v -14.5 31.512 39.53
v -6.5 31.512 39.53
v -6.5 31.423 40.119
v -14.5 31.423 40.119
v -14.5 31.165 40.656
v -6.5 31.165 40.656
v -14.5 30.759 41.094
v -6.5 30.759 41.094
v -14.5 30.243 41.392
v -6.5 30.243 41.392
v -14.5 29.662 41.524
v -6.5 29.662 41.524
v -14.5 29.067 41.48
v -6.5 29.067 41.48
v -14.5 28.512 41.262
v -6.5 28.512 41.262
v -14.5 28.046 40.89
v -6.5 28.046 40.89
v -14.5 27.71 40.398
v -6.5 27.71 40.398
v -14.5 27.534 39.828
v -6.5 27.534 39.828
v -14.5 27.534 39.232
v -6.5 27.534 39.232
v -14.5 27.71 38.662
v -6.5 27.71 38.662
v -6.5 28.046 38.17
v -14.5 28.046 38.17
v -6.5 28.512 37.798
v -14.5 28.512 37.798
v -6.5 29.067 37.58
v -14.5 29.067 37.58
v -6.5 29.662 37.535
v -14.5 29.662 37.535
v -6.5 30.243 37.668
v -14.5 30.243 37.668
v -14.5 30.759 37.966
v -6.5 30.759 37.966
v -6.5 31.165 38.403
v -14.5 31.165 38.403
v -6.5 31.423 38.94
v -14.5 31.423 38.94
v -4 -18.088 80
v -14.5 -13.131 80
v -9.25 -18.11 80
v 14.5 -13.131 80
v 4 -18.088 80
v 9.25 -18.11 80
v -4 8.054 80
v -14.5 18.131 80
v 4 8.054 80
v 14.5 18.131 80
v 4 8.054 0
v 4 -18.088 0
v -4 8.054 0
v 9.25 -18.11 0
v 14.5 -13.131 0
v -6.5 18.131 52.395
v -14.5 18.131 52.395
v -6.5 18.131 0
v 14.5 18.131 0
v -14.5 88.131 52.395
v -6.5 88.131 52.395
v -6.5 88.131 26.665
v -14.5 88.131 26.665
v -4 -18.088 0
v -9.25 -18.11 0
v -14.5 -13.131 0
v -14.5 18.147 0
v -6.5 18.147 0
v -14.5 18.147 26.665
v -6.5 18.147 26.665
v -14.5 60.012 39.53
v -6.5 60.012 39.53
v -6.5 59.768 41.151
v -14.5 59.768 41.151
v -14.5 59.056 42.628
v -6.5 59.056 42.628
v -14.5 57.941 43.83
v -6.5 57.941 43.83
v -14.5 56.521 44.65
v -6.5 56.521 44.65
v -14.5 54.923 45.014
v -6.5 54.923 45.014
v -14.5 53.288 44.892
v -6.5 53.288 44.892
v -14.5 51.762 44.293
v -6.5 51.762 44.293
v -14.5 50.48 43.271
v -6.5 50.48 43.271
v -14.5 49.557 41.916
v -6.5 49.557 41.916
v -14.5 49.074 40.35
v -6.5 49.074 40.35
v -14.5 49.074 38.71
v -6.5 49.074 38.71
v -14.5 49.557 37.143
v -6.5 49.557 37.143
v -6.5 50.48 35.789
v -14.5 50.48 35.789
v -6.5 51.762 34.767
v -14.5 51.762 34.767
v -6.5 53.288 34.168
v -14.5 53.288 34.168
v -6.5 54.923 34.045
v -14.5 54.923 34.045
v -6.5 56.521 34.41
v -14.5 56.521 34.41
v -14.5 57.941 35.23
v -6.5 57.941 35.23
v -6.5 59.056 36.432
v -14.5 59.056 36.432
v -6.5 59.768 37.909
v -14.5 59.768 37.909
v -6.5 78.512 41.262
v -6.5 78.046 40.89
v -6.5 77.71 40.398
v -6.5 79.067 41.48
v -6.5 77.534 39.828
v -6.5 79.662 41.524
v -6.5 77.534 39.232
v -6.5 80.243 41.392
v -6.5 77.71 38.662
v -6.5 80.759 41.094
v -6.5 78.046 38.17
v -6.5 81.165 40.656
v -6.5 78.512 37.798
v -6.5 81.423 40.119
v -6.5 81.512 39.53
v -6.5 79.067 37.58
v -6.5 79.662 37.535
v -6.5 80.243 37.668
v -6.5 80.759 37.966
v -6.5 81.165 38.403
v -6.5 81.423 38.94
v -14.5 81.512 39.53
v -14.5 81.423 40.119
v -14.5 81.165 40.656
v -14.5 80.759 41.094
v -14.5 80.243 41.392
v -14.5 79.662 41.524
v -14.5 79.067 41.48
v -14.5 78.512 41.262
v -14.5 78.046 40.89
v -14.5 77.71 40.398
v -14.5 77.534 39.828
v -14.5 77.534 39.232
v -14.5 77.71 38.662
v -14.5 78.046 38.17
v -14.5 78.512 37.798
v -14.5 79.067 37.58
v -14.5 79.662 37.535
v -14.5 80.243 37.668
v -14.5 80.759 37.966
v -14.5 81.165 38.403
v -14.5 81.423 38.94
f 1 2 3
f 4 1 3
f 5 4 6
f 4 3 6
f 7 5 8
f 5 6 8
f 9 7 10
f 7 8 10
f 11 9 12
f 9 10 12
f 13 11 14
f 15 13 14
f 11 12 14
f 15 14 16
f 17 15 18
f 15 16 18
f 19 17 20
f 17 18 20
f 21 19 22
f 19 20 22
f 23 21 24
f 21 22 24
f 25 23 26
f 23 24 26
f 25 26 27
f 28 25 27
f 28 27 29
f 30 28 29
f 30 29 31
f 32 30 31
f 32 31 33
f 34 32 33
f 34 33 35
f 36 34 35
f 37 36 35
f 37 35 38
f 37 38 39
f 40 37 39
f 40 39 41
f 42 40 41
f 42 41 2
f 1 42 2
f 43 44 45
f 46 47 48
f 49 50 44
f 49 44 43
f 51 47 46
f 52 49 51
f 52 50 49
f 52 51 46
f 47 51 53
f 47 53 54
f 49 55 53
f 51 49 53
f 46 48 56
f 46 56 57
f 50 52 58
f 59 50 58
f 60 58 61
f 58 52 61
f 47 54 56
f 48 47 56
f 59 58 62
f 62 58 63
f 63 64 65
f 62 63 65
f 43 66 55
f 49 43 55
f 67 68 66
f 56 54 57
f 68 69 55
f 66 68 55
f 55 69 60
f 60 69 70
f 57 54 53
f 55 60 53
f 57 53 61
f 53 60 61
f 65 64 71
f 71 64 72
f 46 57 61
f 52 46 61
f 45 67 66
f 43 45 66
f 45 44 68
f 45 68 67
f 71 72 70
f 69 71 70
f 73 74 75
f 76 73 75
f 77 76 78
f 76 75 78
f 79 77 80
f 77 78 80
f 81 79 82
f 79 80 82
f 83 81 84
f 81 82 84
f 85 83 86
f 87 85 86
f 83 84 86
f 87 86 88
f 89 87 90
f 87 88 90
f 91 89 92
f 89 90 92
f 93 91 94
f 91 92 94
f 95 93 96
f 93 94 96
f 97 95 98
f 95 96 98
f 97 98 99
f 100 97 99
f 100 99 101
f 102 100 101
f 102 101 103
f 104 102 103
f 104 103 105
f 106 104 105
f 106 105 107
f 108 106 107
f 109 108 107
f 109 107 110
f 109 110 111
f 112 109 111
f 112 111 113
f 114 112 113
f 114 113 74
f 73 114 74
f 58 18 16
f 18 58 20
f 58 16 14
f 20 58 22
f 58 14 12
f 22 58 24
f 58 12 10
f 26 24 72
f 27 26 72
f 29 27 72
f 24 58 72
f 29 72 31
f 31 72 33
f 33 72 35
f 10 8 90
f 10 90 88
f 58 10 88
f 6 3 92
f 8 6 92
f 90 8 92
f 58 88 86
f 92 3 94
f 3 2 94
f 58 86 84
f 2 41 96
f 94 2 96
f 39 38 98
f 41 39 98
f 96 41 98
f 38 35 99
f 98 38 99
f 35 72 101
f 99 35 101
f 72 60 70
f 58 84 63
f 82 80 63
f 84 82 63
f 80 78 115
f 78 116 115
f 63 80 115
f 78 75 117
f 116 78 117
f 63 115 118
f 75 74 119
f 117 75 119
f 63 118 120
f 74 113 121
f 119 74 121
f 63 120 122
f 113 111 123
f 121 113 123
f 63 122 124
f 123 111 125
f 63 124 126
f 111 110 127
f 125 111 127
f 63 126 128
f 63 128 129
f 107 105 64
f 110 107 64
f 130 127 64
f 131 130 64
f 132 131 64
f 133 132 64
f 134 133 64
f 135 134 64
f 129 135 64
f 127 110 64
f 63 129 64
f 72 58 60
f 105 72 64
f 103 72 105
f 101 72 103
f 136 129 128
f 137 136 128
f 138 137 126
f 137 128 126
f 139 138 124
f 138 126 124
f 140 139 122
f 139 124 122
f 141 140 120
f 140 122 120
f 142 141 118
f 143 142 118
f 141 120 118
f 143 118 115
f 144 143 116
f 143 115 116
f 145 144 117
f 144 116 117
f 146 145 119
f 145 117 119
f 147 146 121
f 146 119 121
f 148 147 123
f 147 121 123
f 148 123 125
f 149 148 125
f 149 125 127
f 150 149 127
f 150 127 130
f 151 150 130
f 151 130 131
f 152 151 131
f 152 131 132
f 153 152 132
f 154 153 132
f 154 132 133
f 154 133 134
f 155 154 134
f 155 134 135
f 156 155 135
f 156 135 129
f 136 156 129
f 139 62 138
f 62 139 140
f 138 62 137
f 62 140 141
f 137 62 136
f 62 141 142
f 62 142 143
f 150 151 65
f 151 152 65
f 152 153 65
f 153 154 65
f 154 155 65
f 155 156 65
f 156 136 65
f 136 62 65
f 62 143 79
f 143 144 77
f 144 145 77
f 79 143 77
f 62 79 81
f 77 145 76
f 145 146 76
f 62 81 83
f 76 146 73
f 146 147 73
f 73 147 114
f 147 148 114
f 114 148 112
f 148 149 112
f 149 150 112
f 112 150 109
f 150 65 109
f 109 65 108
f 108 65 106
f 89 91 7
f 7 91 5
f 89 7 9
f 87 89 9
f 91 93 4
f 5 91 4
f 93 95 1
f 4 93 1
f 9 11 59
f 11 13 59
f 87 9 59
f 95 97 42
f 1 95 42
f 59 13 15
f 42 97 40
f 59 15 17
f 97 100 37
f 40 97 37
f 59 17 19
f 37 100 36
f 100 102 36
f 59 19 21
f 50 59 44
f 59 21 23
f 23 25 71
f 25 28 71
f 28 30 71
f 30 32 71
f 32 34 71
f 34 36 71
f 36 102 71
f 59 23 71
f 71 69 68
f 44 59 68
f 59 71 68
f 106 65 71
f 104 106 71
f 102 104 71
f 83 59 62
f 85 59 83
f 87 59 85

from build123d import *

# Parameters (mm, degrees)
F1_DEPTH = 80
F2_R     = 2
F2_R_2   = 5.5
F3_DEPTH = 25


with BuildPart() as f1:
    # F0 (on Top) → F1 (new body)
    with BuildSketch(Plane.XY):
        Polygon((-14.5, 88.131121), (-14.5, 18.131121), (-14.5, -13.131121), (-9.25, -18.109524), (-4, -18.087926), (-4, 8.054228), (4, 8.054228), (4, -18.087926), (9.25, -18.109524), (14.5, -13.131121), (14.5, 18.131121), (-6.5, 18.131121), (-6.5, 88.131121), align=None)
    extrude(amount=F1_DEPTH)

    # F2 (on Right) → F3 (cut)
    with BuildSketch(Plane.YZ):
        Polygon((23.512104, 52.394919), (88.131121, 52.394919), (88.131121, 80), (18.131121, 80), (18.131121, 52.394919), align=None)
        Polygon((88.131121, -0.940287), (88.131121, 26.664793), (23.512104, 26.664793), (19.000409, 26.664793), (18.146811, 26.664793), (18.146811, 0), (18.146811, -0.940287), align=None)
        with Locations((79.512104, 39.529856)):
            Circle(F2_R)
        with Locations((54.512104, 39.529856)):
            Circle(F2_R_2)
        with Locations((29.512104, 39.529856)):
            Circle(F2_R)
    extrude(amount=-F3_DEPTH, mode=Mode.SUBTRACT)


solid = f1.part
